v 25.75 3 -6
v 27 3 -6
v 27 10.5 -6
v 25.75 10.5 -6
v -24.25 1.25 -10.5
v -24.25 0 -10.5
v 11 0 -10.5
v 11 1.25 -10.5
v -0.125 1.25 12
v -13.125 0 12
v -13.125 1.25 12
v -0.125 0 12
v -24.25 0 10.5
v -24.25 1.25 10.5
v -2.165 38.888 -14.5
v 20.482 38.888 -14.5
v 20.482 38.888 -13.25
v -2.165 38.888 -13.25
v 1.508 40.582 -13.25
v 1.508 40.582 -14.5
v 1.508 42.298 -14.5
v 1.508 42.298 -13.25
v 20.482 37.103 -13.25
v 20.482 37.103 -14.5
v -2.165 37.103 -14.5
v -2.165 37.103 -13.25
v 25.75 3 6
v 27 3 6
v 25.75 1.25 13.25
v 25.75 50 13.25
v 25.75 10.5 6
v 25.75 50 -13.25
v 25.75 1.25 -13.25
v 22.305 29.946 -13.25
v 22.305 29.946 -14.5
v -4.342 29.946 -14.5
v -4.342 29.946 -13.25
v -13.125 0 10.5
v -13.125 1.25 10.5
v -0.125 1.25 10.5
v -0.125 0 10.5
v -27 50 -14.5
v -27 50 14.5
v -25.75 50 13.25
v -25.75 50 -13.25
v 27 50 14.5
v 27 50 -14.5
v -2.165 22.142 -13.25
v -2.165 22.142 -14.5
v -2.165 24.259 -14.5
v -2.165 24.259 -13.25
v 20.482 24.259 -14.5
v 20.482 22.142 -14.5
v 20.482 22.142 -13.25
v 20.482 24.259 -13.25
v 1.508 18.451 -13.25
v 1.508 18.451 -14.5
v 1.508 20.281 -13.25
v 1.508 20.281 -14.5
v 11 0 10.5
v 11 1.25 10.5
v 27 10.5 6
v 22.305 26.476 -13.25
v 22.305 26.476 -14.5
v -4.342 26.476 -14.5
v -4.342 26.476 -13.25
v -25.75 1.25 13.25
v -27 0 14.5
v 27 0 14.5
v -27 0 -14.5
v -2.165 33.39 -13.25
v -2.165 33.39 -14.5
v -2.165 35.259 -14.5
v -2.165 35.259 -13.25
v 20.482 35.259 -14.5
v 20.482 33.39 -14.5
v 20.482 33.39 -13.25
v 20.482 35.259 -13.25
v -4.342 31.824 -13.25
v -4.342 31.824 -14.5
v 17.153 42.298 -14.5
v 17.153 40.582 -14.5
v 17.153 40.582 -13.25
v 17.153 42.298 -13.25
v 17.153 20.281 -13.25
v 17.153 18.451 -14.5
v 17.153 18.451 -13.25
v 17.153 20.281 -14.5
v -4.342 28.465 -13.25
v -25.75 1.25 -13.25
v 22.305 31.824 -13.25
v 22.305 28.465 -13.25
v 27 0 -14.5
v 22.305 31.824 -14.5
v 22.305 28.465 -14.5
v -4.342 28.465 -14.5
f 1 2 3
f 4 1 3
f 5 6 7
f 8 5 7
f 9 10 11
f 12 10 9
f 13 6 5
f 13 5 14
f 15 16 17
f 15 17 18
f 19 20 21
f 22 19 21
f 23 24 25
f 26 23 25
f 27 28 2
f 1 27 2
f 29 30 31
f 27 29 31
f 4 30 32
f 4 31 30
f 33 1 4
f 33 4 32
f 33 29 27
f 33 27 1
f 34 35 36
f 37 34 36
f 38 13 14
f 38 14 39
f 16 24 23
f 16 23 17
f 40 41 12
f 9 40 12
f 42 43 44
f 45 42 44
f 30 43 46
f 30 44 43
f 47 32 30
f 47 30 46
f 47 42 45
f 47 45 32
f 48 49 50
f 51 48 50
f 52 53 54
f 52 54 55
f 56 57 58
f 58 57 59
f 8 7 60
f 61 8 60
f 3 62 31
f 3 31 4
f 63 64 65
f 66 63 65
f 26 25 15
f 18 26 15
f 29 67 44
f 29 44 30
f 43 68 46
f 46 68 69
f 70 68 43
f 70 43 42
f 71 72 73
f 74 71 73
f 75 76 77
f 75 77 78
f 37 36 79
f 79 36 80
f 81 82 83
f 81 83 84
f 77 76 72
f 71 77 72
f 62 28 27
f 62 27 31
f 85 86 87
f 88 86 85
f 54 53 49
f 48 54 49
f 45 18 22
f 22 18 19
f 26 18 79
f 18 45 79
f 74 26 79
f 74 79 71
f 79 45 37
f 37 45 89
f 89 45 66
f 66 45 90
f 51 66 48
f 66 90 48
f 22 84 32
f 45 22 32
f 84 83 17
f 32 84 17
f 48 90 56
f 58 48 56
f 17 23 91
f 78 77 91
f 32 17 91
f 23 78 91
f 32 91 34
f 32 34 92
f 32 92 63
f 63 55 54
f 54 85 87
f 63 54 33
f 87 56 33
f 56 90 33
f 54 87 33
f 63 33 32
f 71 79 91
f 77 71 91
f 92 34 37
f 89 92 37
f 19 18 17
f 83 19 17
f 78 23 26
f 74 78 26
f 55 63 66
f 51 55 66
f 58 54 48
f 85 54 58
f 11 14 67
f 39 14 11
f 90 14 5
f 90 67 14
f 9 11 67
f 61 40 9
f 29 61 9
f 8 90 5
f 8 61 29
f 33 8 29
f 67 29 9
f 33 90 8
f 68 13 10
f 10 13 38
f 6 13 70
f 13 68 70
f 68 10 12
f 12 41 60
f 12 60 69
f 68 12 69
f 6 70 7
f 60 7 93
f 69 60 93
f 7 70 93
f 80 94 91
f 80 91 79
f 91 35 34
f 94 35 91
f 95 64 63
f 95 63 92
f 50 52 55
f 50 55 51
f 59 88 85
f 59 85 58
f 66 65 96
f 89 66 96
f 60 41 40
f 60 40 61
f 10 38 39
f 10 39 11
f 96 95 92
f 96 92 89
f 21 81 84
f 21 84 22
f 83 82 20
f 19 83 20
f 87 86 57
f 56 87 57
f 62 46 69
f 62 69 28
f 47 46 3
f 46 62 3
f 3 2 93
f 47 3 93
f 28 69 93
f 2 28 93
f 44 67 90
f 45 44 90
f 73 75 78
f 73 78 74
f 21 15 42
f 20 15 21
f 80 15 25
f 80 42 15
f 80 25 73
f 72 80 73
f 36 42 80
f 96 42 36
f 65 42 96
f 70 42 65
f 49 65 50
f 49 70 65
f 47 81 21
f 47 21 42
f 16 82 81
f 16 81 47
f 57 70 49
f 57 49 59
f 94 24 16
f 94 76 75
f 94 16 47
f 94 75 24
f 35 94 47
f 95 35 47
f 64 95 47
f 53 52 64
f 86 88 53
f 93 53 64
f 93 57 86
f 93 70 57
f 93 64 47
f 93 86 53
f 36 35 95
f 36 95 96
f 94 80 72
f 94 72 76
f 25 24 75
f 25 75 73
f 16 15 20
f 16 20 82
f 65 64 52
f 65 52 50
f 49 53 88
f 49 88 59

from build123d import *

# Parameters (mm, degrees)
SKETCH1_W           = 54
SKETCH1_H           = 29
BOSS_EXTRUDE1_DEPTH = 50
SHELL1_T            = -1.25
SKETCH2_W           = 35.25
SKETCH2_H           = 21
CUT_EXTRUDE1_DEPTH  = 51
CUT_EXTRUDE2_REACH  = 56
SKETCH3_W           = 12
SKETCH3_H           = 7.5
CUT_EXTRUDE3_REACH  = 52
SKETCH4_W           = 13
SKETCH4_H           = 1.5
CUT_EXTRUDE4_REACH  = 31
SKETCH6_W           = 15.64520267
SKETCH6_H           = 1.830091839
SKETCH6_W_2         = 22.646740458
SKETCH6_H_2         = 2.116515958
SKETCH6_W_3         = 26.646589607
SKETCH6_H_3         = 1.98929613
SKETCH6_H_4         = 1.878154188
SKETCH6_H_5         = 1.86823604
SKETCH6_H_6         = 1.784322078
SKETCH6_H_7         = 1.716719878


with BuildPart() as part:
    # Sketch1 → Boss-Extrude1 (new body)
    with BuildSketch(Plane(origin=(0, 0, 0), x_dir=(1, 0, 0), z_dir=(0, 1, 0))):
        Rectangle(SKETCH1_W, SKETCH1_H)
    extrude(amount=BOSS_EXTRUDE1_DEPTH)

    # Shell1
    shell1_openings = [part.faces().sort_by_distance(p)[0] for p in [
        (0, 50, 0),
    ]]
    offset(amount=SHELL1_T, openings=shell1_openings, kind=Kind.INTERSECTION)

    # Sketch2 → Cut-Extrude1 (cut, through all)
    with BuildSketch(Plane.XZ):
        with Locations((-6.625, 0)):
            Rectangle(SKETCH2_W, SKETCH2_H)
    extrude(amount=-CUT_EXTRUDE1_DEPTH, mode=Mode.SUBTRACT)

    # Sketch3 → Cut-Extrude2 (cut, up to next)
    with BuildSketch(Plane(origin=(27, 0, 0), x_dir=(0, 0, -1), z_dir=(1, 0, 0)), mode=Mode.PRIVATE) as cut_extrude2_sk1:
        with Locations((0, 6.75)):
            Rectangle(SKETCH3_W, SKETCH3_H)
    cut_extrude2_tool1 = extrude(cut_extrude2_sk1.sketch, amount=-CUT_EXTRUDE2_REACH, mode=Mode.PRIVATE) & part.part
    add(cut_extrude2_tool1.solids().sort_by_distance((27, 6.75, 0))[0], mode=Mode.SUBTRACT)

    # Sketch4 → Cut-Extrude3 (cut, up to next)
    with BuildSketch(Plane.XZ, mode=Mode.PRIVATE) as cut_extrude3_sk1:
        with Locations((-6.625, 11.25)):
            Rectangle(SKETCH4_W, SKETCH4_H)
    cut_extrude3_tool1 = extrude(cut_extrude3_sk1.sketch, amount=-CUT_EXTRUDE3_REACH, mode=Mode.PRIVATE) & part.part
    add(cut_extrude3_tool1.solids().sort_by_distance((-6.625, 0, 11.25))[0], mode=Mode.SUBTRACT)

    # Sketch6 → Cut-Extrude4 (cut, up to next)
    with BuildSketch(Plane(origin=(0, 0, -14.5), x_dir=(-1, 0, 0), z_dir=(0, 0, -1)), mode=Mode.PRIVATE) as cut_extrude4_sk1:
        with Locations((-9.330453993, 19.365591302)):
            Rectangle(SKETCH6_W, SKETCH6_H)
    cut_extrude4_tool1 = extrude(cut_extrude4_sk1.sketch, amount=-CUT_EXTRUDE4_REACH, mode=Mode.PRIVATE) & part.part
    add(cut_extrude4_tool1.solids().sort_by_distance((9.330454, 19.365591, -14.5))[0], mode=Mode.SUBTRACT)
    # Sketch6 → Cut-Extrude4 (cut, up to next)
    with BuildSketch(Plane(origin=(0, 0, -14.5), x_dir=(-1, 0, 0), z_dir=(0, 0, -1)), mode=Mode.PRIVATE) as cut_extrude4_sk2:
        with Locations((-9.158424139, 23.200549922)):
            Rectangle(SKETCH6_W_2, SKETCH6_H_2)
    cut_extrude4_tool2 = extrude(cut_extrude4_sk2.sketch, amount=-CUT_EXTRUDE4_REACH, mode=Mode.PRIVATE) & part.part
    add(cut_extrude4_tool2.solids().sort_by_distance((9.158424, 23.20055, -14.5))[0], mode=Mode.SUBTRACT)
    # Sketch6 → Cut-Extrude4 (cut, up to next)
    with BuildSketch(Plane(origin=(0, 0, -14.5), x_dir=(-1, 0, 0), z_dir=(0, 0, -1)), mode=Mode.PRIVATE) as cut_extrude4_sk3:
        with Locations((-8.981382512, 27.470306386)):
            Rectangle(SKETCH6_W_3, SKETCH6_H_3)
    cut_extrude4_tool3 = extrude(cut_extrude4_sk3.sketch, amount=-CUT_EXTRUDE4_REACH, mode=Mode.PRIVATE) & part.part
    add(cut_extrude4_tool3.solids().sort_by_distance((8.981383, 27.470306, -14.5))[0], mode=Mode.SUBTRACT)
    # Sketch6 → Cut-Extrude4 (cut, up to next)
    with BuildSketch(Plane(origin=(0, 0, -14.5), x_dir=(-1, 0, 0), z_dir=(0, 0, -1)), mode=Mode.PRIVATE) as cut_extrude4_sk4:
        with Locations((-8.981382512, 30.885196162)):
            Rectangle(SKETCH6_W_3, SKETCH6_H_4)
    cut_extrude4_tool4 = extrude(cut_extrude4_sk4.sketch, amount=-CUT_EXTRUDE4_REACH, mode=Mode.PRIVATE) & part.part
    add(cut_extrude4_tool4.solids().sort_by_distance((8.981383, 30.885196, -14.5))[0], mode=Mode.SUBTRACT)
    # Sketch6 → Cut-Extrude4 (cut, up to next)
    with BuildSketch(Plane(origin=(0, 0, -14.5), x_dir=(-1, 0, 0), z_dir=(0, 0, -1)), mode=Mode.PRIVATE) as cut_extrude4_sk5:
        with Locations((-9.158424139, 34.324467927)):
            Rectangle(SKETCH6_W_2, SKETCH6_H_5)
    cut_extrude4_tool5 = extrude(cut_extrude4_sk5.sketch, amount=-CUT_EXTRUDE4_REACH, mode=Mode.PRIVATE) & part.part
    add(cut_extrude4_tool5.solids().sort_by_distance((9.158424, 34.324468, -14.5))[0], mode=Mode.SUBTRACT)
    # Sketch6 → Cut-Extrude4 (cut, up to next)
    with BuildSketch(Plane(origin=(0, 0, -14.5), x_dir=(-1, 0, 0), z_dir=(0, 0, -1)), mode=Mode.PRIVATE) as cut_extrude4_sk6:
        with Locations((-9.158424139, 37.995559626)):
            Rectangle(SKETCH6_W_2, SKETCH6_H_6)
    cut_extrude4_tool6 = extrude(cut_extrude4_sk6.sketch, amount=-CUT_EXTRUDE4_REACH, mode=Mode.PRIVATE) & part.part
    add(cut_extrude4_tool6.solids().sort_by_distance((9.158424, 37.99556, -14.5))[0], mode=Mode.SUBTRACT)
    # Sketch6 → Cut-Extrude4 (cut, up to next)
    with BuildSketch(Plane(origin=(0, 0, -14.5), x_dir=(-1, 0, 0), z_dir=(0, 0, -1)), mode=Mode.PRIVATE) as cut_extrude4_sk7:
        with Locations((-9.330453993, 41.439907402)):
            Rectangle(SKETCH6_W, SKETCH6_H_7)
    cut_extrude4_tool7 = extrude(cut_extrude4_sk7.sketch, amount=-CUT_EXTRUDE4_REACH, mode=Mode.PRIVATE) & part.part
    add(cut_extrude4_tool7.solids().sort_by_distance((9.330454, 41.439907, -14.5))[0], mode=Mode.SUBTRACT)


solid = part.part
